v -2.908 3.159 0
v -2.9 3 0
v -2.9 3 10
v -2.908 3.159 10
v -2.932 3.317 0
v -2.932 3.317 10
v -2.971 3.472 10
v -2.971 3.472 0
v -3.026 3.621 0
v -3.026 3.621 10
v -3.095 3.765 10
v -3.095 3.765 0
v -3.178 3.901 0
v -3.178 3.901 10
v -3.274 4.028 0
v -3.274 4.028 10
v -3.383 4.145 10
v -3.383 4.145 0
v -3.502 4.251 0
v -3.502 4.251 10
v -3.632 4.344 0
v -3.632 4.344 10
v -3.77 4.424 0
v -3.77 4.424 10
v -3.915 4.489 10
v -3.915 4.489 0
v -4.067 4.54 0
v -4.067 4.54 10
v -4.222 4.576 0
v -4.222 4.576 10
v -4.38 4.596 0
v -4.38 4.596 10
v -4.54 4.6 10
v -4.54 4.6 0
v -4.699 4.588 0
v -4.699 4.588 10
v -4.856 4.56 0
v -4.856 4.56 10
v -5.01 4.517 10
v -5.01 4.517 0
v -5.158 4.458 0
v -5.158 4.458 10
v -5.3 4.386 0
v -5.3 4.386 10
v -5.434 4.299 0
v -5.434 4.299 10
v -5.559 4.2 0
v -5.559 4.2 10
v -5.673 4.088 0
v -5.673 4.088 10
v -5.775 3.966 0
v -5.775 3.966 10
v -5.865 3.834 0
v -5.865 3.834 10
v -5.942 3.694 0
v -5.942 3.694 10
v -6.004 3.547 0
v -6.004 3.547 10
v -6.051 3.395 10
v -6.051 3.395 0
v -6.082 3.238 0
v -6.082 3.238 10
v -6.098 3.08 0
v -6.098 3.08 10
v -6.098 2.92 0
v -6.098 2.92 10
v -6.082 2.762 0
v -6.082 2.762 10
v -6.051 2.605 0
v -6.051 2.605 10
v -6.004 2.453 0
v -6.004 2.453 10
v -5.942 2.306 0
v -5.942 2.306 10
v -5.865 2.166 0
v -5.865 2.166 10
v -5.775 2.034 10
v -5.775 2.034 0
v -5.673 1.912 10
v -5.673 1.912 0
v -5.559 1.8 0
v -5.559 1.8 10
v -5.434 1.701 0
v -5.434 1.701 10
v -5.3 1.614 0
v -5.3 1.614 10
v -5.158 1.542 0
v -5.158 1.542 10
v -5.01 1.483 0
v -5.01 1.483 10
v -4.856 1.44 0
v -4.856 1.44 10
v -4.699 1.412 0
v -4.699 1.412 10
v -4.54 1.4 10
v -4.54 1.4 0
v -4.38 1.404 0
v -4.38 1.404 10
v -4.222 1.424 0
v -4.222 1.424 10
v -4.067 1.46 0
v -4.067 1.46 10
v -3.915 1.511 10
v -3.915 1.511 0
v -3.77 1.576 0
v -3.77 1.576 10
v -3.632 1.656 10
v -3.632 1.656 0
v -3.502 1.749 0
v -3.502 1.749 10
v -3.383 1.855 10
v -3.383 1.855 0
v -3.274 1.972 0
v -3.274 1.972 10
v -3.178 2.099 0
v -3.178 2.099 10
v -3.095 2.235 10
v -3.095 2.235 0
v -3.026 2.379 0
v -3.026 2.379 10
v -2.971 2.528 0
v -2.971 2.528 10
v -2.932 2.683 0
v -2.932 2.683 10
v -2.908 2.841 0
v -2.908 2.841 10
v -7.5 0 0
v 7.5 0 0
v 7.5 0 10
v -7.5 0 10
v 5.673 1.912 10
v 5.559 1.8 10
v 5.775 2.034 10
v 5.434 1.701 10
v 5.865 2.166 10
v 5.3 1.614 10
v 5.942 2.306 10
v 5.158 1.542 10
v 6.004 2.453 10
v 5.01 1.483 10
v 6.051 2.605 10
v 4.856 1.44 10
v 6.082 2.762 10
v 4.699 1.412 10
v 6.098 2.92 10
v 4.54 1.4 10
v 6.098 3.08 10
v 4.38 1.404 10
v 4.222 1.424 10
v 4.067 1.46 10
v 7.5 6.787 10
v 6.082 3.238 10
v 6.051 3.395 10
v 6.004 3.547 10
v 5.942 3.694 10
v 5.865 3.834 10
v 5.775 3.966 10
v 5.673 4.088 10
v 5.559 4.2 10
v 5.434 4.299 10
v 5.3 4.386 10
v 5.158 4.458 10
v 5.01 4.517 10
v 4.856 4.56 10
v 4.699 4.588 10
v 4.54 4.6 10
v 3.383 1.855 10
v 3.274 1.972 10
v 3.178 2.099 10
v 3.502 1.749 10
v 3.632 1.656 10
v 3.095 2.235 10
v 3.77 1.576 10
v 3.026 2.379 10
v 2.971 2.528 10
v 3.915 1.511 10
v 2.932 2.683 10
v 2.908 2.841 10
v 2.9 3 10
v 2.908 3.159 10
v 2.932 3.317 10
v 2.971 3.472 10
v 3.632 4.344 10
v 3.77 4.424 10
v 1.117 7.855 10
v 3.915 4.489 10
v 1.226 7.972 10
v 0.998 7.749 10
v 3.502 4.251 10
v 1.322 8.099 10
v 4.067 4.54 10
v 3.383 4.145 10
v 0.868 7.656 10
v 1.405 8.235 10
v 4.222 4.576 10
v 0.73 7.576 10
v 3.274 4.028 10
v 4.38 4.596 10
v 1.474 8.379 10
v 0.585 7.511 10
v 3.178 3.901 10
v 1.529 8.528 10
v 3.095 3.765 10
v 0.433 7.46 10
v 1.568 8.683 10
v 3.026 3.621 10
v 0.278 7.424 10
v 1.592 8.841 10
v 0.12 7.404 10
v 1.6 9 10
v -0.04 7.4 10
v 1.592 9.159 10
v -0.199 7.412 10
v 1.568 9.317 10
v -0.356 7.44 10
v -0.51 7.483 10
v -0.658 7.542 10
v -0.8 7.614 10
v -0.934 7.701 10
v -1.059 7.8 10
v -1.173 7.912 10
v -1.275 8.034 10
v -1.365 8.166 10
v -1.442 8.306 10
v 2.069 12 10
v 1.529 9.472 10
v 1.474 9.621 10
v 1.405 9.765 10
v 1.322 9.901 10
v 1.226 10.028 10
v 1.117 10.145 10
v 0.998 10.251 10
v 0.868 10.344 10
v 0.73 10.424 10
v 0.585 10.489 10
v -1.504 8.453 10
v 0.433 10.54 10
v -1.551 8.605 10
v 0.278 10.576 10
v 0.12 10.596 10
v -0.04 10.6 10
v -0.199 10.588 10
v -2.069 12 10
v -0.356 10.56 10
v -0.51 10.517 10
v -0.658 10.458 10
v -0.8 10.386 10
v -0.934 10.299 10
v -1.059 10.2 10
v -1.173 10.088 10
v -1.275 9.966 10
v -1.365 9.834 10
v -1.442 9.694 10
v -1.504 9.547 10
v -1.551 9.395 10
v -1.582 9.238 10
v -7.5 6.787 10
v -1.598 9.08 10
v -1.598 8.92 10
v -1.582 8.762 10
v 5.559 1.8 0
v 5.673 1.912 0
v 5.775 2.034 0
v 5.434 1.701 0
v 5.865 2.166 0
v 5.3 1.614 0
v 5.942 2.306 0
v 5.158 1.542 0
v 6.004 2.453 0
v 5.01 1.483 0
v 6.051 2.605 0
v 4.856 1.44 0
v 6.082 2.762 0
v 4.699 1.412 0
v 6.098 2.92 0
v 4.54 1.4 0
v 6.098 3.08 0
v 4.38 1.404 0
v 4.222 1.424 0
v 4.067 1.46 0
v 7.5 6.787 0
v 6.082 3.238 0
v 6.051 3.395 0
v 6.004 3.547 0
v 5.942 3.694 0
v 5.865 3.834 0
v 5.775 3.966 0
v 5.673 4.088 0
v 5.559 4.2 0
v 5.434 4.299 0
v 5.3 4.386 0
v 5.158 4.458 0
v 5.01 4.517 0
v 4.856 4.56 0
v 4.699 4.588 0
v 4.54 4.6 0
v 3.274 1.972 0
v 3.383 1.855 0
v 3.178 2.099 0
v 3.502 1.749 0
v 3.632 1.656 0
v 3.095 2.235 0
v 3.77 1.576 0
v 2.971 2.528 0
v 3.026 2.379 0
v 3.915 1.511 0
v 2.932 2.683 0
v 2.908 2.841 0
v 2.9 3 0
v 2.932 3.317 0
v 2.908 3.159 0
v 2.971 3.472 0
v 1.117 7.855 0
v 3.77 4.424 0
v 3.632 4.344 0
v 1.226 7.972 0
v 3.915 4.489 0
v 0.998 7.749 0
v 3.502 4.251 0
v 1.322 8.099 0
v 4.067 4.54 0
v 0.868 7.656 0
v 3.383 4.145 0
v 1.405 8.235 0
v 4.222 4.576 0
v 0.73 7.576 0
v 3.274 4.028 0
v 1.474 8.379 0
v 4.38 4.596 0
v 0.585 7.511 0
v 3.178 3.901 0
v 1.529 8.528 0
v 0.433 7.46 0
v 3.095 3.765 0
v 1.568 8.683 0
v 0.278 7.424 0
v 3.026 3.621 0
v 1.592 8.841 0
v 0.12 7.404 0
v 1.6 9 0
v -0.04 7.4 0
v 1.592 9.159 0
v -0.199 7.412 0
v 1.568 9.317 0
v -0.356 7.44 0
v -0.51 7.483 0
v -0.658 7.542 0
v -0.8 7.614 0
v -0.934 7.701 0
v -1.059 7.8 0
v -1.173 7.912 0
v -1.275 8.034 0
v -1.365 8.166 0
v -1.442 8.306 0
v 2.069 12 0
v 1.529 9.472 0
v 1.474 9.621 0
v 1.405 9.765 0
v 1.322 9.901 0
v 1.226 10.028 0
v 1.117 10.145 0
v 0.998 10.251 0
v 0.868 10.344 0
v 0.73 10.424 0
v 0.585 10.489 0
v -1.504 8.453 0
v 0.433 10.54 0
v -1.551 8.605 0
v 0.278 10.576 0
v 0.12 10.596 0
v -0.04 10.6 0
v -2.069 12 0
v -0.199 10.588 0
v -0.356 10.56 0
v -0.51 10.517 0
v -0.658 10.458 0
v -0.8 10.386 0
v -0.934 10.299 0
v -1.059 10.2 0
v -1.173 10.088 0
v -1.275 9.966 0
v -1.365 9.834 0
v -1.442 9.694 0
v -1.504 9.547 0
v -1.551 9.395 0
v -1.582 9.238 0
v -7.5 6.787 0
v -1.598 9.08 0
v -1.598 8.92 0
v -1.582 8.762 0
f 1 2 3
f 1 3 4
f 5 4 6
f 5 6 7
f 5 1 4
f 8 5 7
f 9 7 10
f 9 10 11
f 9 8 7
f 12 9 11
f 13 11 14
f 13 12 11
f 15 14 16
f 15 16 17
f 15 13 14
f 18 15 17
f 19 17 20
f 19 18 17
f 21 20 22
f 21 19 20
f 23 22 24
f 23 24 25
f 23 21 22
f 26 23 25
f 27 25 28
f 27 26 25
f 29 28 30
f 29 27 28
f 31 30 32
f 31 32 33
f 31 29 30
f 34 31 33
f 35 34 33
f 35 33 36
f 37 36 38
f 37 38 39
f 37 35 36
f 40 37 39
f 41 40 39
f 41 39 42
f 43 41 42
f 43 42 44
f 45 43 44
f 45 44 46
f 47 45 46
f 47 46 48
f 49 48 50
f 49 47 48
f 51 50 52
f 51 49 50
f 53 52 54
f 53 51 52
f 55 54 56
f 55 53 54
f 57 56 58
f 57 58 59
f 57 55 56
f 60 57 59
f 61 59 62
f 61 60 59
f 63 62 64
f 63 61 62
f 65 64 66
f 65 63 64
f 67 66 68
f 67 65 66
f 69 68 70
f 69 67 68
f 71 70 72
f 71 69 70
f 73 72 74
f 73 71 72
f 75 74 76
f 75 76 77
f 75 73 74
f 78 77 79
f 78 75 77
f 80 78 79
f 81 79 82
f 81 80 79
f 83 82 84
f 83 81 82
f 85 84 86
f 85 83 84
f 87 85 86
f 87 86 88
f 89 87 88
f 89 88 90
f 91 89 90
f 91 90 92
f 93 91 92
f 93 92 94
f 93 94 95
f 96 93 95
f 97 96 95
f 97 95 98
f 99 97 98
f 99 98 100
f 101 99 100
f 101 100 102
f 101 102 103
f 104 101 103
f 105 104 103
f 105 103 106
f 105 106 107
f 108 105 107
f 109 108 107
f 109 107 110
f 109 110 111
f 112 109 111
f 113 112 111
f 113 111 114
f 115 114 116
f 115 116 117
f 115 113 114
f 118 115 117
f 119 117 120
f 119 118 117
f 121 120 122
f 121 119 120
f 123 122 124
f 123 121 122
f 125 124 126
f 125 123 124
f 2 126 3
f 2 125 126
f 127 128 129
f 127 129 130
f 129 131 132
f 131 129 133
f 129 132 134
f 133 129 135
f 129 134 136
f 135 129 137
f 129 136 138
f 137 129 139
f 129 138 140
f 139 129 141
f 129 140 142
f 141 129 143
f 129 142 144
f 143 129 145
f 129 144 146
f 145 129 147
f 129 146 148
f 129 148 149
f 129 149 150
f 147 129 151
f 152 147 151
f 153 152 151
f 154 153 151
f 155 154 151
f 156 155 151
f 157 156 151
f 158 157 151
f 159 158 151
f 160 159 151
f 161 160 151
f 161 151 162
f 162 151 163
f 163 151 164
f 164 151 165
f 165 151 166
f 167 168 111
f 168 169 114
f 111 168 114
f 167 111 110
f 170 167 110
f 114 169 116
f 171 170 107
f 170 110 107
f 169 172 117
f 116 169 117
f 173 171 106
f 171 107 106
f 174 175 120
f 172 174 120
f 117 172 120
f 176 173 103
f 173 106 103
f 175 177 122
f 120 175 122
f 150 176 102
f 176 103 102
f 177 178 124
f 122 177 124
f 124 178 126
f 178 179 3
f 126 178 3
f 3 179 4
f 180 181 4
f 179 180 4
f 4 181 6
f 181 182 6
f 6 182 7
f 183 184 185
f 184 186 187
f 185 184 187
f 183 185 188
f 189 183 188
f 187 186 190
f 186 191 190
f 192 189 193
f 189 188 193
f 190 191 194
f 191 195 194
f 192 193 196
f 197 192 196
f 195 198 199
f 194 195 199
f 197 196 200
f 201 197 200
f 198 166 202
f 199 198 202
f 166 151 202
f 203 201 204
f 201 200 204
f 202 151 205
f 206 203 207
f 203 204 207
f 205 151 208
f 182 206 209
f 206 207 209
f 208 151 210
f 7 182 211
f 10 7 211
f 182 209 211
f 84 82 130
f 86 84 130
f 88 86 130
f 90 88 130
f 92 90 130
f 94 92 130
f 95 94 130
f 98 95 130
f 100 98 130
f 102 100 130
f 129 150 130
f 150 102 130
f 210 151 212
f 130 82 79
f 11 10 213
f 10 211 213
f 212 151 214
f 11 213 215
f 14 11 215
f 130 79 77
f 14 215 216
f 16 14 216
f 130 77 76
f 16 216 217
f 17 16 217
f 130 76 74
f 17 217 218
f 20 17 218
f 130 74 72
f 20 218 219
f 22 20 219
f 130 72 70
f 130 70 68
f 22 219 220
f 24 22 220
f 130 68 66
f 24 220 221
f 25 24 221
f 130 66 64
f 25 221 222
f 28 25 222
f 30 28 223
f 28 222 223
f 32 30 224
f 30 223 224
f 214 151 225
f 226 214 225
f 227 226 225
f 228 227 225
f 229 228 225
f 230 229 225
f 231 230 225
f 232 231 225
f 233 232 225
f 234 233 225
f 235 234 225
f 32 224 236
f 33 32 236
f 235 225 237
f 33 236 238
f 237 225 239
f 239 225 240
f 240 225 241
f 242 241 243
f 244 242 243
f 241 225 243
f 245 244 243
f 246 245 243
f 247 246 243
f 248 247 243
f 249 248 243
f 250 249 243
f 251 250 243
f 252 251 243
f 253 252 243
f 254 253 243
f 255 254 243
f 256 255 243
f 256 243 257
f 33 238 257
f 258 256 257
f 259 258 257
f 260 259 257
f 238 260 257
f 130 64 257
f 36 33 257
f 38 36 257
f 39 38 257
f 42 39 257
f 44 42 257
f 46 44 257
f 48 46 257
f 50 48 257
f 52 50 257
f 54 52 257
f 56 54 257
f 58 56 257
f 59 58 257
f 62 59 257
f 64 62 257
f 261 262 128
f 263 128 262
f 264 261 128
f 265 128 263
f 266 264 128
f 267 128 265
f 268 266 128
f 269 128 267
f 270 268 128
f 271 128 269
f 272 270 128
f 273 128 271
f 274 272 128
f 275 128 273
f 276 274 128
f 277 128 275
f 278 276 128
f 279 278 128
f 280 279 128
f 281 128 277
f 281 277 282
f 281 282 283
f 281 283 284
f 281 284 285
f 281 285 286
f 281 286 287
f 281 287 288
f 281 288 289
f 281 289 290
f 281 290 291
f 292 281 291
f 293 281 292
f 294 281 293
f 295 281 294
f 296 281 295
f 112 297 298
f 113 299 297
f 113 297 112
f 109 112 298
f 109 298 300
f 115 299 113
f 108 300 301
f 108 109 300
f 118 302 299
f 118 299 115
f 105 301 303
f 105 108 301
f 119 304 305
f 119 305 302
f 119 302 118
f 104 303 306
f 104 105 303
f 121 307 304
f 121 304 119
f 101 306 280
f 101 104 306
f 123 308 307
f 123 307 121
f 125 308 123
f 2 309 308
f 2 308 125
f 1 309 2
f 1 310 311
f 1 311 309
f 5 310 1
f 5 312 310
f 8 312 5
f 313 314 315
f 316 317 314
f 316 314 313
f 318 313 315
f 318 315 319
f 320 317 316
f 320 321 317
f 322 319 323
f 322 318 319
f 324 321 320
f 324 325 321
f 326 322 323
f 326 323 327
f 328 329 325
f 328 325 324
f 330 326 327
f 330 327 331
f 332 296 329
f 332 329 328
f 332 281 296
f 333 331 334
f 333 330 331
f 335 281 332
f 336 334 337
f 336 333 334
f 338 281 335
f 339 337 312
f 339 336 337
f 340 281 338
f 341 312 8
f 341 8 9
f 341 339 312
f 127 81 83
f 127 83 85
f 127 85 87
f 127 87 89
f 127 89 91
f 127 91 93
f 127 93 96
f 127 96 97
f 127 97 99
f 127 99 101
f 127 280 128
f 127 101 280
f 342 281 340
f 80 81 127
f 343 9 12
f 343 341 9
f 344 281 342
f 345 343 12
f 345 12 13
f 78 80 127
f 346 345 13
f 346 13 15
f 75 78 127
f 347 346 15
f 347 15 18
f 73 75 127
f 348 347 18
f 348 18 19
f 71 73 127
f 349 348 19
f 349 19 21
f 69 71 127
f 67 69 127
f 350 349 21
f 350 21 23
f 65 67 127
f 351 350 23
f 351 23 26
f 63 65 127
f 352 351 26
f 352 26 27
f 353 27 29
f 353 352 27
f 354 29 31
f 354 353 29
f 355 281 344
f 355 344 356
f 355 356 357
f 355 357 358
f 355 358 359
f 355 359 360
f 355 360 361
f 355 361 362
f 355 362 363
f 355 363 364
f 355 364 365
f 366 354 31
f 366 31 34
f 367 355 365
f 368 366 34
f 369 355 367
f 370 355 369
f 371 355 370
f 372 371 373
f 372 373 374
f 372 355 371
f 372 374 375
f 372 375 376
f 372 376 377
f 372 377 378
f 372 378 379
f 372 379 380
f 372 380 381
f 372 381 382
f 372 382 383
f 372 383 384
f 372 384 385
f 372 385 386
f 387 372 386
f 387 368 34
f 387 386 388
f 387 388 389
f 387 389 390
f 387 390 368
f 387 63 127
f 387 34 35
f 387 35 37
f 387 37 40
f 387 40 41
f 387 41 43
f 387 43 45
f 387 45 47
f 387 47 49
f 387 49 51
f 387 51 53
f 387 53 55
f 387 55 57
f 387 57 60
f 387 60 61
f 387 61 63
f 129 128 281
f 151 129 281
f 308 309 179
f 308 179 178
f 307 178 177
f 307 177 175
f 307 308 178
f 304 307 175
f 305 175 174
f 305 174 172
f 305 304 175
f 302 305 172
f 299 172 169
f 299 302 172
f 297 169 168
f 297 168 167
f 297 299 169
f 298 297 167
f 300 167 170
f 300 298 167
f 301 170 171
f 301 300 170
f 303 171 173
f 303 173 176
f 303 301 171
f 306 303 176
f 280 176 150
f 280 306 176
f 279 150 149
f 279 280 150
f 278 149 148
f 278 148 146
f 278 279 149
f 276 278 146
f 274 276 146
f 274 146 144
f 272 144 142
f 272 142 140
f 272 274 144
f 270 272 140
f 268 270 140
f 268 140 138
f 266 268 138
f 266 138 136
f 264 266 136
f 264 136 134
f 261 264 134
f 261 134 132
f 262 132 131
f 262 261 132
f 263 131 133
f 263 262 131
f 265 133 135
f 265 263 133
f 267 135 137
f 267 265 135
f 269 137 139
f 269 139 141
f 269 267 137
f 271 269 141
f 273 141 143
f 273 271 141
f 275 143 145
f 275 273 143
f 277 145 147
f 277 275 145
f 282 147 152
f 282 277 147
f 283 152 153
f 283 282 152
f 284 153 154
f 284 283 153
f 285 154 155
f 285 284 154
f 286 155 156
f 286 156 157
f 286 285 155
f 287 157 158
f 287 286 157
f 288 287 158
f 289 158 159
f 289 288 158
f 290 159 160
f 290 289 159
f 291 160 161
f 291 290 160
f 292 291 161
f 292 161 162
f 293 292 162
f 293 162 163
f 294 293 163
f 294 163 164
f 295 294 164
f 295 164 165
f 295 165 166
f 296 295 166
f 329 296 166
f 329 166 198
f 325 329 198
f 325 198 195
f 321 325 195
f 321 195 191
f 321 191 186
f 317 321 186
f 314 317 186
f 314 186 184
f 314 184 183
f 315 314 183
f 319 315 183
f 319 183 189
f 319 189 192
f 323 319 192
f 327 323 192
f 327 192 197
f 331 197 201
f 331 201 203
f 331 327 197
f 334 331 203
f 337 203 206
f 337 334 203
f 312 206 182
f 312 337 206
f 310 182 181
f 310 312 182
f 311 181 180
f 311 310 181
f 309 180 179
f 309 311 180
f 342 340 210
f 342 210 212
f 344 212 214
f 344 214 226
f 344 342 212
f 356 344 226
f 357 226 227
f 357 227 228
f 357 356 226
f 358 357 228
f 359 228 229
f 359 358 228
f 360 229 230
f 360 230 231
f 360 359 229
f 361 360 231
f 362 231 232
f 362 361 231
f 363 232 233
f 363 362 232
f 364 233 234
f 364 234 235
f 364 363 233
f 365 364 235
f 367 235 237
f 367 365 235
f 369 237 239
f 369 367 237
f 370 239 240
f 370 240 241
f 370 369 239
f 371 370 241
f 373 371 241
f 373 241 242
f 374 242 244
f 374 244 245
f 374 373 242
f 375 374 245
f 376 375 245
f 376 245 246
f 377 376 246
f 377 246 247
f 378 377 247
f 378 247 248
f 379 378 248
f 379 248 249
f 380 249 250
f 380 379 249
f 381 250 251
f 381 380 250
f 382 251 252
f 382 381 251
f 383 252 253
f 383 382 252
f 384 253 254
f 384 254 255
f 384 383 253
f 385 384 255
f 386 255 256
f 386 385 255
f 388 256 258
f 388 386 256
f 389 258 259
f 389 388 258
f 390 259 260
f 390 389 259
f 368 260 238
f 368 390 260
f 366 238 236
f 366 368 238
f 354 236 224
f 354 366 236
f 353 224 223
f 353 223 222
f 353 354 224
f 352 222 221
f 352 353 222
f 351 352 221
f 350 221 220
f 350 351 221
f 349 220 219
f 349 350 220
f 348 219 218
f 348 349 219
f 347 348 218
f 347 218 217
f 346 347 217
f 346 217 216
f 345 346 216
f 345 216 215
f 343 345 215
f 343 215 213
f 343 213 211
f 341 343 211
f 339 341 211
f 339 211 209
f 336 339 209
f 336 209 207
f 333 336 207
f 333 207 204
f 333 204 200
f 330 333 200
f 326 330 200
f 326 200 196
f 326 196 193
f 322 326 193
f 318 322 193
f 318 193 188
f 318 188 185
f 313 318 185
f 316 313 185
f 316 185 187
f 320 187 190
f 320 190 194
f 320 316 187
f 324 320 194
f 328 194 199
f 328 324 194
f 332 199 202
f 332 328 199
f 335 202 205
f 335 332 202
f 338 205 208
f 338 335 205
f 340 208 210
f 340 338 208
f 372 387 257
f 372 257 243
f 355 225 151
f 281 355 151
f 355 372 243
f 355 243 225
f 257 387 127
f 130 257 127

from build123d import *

# Parameters (mm, degrees)
SKETCH1_R           = 1.6
BOSS_EXTRUDE1_DEPTH = 10


with BuildPart() as part:
    # Sketch1 → Boss-Extrude1 (new body)
    with BuildSketch(Plane.XY):
        Polygon((7.5, 0), (-7.5, 0), (-7.5, 6), (-7.5, 6.78663835), (-2.068965517, 12), (2.068965517, 12), (7.5, 6.78663835), (7.5, 6), align=None)
        with Locations((0, 9)):
            Circle(SKETCH1_R, mode=Mode.SUBTRACT)
        with Locations((-4.5, 3)):
            Circle(SKETCH1_R, mode=Mode.SUBTRACT)
        with Locations(Location((4.5, 3, 0), (0, 0, 180))):
            Circle(SKETCH1_R, mode=Mode.SUBTRACT)
    extrude(amount=BOSS_EXTRUDE1_DEPTH)


solid = part.part
